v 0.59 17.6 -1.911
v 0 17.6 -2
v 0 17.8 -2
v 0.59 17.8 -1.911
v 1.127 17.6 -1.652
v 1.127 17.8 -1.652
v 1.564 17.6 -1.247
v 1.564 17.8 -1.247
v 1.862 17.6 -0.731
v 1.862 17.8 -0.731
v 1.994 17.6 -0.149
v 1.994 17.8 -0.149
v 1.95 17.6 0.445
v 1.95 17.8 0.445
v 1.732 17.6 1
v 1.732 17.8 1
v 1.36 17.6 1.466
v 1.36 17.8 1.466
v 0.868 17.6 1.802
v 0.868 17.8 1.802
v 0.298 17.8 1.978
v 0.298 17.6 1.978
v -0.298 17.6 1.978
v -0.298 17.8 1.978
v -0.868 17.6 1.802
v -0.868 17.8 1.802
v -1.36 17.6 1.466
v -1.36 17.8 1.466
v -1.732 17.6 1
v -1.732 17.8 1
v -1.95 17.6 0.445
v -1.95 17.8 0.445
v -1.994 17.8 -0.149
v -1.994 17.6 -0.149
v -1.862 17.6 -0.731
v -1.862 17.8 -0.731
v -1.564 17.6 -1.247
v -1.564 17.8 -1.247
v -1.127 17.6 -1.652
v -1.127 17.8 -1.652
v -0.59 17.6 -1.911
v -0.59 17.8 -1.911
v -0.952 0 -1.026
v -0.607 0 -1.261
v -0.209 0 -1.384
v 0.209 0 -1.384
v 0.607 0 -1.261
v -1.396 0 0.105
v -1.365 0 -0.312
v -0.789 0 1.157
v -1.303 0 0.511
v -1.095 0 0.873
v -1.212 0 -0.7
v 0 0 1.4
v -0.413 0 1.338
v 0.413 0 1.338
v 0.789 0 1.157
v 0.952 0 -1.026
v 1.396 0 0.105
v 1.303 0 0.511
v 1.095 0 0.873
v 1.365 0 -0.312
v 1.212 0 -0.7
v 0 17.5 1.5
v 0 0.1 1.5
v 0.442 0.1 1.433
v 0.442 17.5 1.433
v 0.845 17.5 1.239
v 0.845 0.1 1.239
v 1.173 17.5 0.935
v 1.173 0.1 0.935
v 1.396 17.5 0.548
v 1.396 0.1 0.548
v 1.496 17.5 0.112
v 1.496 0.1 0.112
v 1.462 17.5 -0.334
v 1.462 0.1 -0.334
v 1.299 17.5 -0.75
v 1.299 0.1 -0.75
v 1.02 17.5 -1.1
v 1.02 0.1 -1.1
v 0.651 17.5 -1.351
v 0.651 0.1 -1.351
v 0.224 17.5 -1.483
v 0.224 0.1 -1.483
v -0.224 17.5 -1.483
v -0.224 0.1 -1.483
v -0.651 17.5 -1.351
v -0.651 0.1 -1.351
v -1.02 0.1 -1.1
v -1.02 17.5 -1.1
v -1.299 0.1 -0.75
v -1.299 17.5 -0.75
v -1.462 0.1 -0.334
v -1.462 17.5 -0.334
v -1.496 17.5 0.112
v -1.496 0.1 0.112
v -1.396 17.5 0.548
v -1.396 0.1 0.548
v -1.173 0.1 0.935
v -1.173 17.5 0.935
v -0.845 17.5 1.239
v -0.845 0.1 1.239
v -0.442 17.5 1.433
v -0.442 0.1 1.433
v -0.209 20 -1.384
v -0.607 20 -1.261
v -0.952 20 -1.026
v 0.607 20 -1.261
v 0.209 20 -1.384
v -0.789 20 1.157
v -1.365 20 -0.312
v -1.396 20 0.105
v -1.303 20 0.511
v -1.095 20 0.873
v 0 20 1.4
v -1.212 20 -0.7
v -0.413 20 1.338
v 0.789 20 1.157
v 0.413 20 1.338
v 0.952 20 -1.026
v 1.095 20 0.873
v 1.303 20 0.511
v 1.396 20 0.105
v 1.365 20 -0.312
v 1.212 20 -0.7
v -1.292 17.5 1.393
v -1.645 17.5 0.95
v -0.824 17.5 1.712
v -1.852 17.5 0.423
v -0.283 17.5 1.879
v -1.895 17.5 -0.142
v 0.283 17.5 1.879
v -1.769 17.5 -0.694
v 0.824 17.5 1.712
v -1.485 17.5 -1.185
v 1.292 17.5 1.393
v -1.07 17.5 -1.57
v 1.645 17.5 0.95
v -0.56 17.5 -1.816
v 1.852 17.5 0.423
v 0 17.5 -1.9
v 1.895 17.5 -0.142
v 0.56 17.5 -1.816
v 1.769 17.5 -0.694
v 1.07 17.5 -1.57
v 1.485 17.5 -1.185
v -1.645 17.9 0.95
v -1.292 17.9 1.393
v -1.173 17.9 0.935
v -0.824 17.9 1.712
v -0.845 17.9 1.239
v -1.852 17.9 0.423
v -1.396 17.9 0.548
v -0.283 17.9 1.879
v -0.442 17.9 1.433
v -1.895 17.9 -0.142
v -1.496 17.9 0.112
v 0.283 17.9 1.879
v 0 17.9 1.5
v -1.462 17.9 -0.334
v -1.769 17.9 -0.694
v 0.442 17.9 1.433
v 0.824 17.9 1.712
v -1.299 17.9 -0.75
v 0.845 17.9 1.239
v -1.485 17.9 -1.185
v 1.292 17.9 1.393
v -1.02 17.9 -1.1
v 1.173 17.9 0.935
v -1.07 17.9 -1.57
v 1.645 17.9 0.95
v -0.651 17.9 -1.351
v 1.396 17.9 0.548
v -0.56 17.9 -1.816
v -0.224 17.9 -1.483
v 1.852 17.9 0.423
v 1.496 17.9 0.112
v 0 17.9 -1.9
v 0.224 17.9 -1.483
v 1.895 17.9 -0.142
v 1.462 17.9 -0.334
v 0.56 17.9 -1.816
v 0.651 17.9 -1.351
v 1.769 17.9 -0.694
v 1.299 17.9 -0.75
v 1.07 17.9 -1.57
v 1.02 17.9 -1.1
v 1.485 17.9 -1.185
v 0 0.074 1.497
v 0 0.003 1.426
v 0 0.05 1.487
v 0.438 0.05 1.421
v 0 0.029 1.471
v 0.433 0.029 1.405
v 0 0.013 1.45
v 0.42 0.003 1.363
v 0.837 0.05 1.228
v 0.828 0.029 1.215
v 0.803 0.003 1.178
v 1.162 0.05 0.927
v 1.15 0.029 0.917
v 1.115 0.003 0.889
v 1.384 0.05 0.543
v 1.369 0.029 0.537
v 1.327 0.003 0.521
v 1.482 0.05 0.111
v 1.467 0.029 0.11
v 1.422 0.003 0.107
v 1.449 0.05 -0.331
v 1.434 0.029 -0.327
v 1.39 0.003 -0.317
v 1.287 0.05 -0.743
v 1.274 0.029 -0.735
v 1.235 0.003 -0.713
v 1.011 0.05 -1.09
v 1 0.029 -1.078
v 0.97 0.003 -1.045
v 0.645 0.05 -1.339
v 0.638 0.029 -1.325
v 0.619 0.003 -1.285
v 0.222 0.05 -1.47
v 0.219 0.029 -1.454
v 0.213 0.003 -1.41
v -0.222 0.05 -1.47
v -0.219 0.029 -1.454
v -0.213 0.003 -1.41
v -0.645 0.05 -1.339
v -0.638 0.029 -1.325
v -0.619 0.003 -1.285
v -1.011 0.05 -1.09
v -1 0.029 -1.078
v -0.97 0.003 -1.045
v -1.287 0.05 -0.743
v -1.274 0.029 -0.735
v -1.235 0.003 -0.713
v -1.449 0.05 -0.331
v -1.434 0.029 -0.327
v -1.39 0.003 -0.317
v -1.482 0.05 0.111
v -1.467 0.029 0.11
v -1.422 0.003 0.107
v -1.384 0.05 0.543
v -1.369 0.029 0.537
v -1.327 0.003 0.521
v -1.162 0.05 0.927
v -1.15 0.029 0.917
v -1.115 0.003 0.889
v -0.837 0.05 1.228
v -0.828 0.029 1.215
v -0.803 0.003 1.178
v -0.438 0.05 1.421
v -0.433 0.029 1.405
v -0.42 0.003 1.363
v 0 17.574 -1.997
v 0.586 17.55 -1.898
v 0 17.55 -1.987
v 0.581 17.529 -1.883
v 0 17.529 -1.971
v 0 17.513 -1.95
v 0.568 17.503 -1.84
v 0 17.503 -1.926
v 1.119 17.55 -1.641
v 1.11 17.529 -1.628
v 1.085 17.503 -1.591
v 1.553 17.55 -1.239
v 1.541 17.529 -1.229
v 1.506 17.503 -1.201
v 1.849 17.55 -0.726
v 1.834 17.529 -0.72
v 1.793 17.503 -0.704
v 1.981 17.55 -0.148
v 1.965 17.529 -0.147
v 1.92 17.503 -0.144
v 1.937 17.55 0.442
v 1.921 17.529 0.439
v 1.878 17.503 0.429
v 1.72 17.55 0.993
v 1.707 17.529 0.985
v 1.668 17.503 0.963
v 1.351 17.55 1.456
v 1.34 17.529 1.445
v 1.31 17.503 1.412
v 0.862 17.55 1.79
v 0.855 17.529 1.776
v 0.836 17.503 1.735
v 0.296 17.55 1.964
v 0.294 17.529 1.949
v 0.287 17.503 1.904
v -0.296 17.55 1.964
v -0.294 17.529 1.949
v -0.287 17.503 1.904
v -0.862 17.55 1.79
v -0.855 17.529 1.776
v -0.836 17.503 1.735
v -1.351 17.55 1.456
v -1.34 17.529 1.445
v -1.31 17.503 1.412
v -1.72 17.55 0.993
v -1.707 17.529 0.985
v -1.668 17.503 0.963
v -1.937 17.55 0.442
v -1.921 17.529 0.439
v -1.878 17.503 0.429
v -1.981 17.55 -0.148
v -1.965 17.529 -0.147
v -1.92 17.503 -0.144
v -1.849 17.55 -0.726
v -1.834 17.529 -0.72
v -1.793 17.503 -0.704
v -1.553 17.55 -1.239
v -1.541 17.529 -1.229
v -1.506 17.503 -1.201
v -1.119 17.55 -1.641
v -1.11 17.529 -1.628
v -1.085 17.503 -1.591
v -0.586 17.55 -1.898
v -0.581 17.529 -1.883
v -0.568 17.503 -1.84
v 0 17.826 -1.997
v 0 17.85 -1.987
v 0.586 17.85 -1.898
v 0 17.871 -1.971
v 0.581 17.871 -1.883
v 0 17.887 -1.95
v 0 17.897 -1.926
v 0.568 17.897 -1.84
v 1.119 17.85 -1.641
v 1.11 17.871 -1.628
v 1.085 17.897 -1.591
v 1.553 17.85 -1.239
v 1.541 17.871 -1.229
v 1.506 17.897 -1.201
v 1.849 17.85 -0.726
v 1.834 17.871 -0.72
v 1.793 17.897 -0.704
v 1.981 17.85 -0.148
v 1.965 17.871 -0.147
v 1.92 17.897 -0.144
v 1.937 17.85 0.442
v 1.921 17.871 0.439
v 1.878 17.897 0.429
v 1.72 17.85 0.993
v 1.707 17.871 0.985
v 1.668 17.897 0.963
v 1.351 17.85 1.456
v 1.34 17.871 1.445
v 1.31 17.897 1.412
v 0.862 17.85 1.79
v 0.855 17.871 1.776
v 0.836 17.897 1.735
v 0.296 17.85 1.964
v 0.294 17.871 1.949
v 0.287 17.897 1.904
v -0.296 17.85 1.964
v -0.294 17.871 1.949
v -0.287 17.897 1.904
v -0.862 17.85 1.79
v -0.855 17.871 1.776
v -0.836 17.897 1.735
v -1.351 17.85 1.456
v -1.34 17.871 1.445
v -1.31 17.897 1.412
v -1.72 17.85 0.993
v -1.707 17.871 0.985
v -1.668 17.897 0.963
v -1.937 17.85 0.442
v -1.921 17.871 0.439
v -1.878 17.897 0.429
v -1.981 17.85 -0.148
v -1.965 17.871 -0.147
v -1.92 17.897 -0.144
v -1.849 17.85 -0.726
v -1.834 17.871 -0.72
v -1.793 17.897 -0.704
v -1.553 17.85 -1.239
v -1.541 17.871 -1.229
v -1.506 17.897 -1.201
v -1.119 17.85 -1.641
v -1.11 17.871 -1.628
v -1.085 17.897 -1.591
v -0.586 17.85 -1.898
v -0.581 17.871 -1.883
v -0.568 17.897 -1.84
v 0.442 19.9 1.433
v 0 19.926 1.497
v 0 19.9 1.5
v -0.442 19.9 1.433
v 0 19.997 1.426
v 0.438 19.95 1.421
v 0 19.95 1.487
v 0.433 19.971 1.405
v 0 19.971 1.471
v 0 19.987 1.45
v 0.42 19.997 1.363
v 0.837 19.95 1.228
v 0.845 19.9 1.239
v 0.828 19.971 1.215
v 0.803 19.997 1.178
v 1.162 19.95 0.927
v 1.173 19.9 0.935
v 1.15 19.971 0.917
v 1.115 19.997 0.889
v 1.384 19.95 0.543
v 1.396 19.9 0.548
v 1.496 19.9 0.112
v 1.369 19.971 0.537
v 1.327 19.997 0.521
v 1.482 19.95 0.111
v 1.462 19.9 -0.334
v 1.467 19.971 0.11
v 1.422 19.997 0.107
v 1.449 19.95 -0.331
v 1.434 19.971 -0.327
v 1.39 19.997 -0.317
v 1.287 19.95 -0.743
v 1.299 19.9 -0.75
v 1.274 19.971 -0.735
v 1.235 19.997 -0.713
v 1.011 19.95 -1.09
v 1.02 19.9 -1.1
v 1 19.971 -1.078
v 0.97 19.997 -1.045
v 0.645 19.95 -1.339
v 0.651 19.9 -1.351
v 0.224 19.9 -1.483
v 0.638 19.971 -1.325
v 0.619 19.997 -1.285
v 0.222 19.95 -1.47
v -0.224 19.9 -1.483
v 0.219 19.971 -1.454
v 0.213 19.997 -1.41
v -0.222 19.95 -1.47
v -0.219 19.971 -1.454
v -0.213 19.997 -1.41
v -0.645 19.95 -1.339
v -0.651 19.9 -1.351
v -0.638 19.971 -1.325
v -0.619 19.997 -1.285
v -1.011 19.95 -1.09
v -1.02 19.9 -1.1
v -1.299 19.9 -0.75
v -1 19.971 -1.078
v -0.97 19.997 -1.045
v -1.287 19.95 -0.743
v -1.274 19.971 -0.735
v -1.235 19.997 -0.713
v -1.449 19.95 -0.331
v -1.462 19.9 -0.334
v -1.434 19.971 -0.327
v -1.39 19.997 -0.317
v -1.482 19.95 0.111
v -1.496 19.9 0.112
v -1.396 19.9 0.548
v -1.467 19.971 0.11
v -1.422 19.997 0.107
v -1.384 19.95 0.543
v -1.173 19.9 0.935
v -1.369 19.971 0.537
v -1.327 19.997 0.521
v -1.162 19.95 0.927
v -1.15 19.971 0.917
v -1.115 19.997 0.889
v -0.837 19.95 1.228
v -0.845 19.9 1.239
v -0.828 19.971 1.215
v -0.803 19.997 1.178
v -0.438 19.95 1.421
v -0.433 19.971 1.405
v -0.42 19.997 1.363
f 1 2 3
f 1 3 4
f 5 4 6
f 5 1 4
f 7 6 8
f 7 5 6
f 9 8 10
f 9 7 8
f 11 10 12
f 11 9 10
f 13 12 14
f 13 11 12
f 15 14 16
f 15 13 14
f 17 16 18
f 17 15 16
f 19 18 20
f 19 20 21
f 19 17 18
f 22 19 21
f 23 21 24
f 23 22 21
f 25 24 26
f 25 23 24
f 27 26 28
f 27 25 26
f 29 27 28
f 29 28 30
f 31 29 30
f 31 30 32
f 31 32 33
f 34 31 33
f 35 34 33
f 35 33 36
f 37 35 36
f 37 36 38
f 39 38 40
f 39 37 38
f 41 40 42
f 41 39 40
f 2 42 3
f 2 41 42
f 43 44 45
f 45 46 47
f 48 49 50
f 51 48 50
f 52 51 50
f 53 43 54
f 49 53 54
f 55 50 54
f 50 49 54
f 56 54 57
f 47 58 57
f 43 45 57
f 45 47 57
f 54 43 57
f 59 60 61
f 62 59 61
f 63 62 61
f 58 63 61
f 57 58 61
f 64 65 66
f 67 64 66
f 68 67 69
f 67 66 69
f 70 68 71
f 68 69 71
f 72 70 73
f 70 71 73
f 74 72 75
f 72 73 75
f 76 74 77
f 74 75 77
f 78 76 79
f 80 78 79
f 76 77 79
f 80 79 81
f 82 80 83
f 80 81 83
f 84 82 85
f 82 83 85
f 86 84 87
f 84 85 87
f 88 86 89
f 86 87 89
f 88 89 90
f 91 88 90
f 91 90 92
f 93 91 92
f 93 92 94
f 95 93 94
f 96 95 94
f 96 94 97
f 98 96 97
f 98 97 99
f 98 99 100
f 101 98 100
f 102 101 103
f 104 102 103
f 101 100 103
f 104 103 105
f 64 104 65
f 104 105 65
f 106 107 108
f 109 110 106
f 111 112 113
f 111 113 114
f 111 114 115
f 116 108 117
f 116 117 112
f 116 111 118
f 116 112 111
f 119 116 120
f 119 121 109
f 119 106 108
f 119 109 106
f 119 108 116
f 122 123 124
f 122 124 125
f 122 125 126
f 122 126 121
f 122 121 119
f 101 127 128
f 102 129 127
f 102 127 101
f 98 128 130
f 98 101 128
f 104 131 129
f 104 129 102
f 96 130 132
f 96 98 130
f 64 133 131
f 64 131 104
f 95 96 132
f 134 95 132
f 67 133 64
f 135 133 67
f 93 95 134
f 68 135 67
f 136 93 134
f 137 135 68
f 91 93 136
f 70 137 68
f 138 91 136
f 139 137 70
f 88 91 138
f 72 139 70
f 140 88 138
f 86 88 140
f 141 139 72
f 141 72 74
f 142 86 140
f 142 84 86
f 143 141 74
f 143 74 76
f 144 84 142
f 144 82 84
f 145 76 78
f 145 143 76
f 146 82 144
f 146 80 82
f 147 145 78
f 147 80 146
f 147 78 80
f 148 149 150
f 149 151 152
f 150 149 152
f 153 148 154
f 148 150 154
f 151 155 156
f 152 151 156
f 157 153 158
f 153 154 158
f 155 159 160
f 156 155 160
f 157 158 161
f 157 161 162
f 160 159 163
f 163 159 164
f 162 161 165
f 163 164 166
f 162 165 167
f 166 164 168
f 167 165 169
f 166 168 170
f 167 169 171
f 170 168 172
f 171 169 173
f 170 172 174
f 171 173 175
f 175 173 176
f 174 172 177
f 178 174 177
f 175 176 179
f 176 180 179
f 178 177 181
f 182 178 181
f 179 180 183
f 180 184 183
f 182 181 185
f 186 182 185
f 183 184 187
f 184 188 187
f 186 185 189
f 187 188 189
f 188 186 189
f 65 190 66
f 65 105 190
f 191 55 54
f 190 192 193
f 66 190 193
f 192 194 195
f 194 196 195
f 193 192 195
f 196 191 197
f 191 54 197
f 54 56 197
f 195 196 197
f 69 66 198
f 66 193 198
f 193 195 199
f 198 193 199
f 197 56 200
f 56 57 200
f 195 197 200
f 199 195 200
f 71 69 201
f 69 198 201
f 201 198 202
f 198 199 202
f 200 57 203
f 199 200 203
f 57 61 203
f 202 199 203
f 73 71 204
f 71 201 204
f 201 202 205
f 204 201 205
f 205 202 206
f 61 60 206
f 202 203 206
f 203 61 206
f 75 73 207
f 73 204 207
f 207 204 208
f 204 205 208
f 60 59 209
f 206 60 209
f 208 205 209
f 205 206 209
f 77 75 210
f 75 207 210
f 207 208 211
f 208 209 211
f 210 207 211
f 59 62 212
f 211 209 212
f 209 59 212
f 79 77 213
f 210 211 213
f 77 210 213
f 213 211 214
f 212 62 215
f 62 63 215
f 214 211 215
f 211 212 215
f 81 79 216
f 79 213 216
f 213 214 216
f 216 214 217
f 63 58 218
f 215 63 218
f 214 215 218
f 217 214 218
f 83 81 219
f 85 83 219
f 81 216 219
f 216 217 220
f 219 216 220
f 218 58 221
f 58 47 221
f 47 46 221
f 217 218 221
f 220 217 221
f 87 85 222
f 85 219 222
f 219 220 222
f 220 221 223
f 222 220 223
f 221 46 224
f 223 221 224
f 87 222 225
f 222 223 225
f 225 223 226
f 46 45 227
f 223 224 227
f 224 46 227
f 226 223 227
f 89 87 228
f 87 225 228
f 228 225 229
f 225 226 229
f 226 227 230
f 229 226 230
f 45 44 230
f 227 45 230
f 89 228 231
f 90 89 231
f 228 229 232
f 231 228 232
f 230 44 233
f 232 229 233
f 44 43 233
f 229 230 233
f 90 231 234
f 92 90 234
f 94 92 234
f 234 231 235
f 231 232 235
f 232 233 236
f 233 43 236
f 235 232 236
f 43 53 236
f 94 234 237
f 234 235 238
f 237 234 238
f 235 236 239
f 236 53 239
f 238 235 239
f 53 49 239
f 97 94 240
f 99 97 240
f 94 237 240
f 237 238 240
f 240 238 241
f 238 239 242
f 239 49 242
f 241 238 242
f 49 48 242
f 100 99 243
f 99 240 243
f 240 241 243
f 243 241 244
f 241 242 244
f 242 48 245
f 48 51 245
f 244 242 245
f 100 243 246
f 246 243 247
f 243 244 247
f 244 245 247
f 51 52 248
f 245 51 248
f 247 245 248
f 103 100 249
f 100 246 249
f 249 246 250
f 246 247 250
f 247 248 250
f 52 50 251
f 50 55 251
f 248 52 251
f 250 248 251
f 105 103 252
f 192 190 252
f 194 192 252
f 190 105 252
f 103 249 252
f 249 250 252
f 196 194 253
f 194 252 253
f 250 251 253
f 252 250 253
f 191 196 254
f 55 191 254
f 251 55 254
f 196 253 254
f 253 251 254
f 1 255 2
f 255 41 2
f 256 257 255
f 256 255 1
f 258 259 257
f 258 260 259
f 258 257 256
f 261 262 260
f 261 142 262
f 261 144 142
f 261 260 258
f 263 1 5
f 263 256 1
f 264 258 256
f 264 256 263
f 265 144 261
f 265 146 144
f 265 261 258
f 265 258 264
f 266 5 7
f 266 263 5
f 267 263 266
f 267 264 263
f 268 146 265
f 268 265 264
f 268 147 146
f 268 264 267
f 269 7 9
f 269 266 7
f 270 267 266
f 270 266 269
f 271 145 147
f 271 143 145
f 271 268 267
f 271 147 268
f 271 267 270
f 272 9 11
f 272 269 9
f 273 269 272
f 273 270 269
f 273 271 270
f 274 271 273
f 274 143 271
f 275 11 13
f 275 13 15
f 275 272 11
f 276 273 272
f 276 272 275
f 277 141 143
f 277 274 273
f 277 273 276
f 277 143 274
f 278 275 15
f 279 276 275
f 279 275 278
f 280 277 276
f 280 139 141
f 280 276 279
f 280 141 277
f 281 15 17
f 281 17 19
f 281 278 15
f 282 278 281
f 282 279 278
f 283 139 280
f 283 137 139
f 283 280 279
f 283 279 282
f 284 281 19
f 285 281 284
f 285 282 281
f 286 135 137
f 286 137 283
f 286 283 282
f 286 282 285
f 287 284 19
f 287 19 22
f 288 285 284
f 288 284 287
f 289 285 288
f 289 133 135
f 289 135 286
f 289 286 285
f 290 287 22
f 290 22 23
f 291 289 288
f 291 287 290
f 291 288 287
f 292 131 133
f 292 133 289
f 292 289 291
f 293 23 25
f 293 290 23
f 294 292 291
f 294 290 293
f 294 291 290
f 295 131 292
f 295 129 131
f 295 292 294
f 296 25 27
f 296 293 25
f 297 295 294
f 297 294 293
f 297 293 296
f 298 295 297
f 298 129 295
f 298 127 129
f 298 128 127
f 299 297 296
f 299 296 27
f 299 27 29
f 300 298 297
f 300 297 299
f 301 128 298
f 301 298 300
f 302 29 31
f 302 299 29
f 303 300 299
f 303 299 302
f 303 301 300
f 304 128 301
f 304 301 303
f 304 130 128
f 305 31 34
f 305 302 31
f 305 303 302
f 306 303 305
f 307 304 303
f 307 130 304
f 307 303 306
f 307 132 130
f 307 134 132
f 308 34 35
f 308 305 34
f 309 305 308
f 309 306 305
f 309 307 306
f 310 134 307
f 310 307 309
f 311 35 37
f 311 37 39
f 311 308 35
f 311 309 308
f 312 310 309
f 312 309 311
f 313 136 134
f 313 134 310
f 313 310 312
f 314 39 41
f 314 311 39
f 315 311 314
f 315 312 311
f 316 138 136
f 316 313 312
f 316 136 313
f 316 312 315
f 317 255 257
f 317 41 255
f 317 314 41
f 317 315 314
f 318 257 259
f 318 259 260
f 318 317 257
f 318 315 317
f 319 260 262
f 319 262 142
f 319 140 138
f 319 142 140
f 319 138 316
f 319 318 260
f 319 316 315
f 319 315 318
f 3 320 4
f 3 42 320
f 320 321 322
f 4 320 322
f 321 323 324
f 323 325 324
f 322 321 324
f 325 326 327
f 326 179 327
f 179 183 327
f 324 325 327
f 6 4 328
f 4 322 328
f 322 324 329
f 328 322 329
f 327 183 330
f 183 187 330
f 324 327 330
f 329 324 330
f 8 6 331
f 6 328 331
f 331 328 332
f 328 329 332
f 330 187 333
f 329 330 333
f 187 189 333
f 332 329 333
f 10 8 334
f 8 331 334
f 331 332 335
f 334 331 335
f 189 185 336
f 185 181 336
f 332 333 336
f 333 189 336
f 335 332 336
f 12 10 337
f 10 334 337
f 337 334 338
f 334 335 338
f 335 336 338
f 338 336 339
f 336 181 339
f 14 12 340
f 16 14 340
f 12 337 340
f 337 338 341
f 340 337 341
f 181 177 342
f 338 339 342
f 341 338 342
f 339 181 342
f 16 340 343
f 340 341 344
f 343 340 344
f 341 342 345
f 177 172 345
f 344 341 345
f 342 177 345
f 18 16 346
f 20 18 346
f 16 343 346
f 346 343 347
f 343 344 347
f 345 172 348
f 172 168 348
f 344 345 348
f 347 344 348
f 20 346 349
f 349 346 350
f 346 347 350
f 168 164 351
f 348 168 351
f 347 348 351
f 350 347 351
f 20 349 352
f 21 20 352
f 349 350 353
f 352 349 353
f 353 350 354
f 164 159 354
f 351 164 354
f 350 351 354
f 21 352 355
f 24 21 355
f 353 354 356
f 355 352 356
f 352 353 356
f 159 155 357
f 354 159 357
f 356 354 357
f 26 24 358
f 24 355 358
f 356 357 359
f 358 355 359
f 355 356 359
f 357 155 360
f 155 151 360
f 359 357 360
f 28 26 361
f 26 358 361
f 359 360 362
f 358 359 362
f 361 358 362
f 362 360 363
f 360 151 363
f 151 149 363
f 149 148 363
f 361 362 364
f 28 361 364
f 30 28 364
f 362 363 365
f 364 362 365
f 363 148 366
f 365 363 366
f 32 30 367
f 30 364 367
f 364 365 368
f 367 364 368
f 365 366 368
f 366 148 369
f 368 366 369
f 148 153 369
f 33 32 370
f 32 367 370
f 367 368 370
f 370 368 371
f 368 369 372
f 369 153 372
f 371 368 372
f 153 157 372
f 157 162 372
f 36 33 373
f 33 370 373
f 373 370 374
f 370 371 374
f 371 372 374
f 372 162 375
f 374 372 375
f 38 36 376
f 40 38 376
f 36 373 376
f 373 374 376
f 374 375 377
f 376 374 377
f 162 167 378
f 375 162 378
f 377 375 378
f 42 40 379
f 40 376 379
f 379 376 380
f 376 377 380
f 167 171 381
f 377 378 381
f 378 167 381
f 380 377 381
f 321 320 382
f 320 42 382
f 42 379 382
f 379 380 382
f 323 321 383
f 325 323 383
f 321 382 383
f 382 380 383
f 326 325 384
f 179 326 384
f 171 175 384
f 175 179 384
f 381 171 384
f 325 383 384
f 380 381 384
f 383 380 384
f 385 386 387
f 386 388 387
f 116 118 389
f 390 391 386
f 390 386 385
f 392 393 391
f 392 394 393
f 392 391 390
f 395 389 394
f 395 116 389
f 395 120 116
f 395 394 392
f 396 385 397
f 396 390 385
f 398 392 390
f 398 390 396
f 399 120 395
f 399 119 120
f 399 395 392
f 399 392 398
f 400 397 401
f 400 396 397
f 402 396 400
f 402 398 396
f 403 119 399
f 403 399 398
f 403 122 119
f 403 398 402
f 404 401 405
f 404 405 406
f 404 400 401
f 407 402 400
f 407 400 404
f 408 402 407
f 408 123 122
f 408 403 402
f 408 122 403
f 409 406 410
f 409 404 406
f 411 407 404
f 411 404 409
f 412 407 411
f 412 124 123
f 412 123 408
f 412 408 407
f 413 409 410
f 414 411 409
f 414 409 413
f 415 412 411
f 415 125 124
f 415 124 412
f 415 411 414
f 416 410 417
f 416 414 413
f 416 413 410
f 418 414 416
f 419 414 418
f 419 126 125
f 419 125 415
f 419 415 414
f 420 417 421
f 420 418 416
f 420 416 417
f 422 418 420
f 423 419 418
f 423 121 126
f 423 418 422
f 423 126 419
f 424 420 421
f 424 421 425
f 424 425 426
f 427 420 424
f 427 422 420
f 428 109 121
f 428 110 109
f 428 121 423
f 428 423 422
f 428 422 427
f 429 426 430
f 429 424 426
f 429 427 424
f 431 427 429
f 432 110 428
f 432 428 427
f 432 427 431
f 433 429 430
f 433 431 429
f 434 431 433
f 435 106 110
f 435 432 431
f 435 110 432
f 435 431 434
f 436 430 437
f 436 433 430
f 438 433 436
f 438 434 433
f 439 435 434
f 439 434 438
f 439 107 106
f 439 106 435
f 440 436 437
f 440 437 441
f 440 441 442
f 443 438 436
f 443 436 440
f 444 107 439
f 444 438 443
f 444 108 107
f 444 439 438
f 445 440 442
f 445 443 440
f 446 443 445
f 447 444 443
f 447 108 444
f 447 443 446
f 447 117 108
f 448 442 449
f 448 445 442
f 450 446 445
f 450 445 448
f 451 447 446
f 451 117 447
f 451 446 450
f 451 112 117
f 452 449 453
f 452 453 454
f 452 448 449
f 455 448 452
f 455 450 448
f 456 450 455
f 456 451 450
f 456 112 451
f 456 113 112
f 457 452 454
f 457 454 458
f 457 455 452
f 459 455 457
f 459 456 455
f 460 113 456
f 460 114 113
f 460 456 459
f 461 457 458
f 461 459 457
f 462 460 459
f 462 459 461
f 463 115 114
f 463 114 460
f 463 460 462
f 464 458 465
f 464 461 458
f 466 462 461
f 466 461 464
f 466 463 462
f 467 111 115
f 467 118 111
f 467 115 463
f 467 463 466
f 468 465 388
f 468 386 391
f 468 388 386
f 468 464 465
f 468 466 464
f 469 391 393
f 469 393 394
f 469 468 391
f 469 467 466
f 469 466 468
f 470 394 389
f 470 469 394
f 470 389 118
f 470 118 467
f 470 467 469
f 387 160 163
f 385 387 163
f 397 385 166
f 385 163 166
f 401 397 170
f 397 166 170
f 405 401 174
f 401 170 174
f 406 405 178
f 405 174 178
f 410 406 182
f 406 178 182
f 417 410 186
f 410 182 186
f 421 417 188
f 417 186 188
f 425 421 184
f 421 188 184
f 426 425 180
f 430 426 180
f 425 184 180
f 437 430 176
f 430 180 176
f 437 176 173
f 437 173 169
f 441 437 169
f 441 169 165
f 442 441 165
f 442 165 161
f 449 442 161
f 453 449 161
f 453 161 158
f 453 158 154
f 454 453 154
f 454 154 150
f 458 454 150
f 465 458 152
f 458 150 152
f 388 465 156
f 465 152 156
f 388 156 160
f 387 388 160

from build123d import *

# Parameters (mm, degrees)
SKETCH_1_R      = 1.5
EXTRUDE_1_DEPTH = 20
EXTRUDE_START   = 2.5
SKETCH_2_R      = 2
SKETCH_2_R_2    = 1.5
EXTRUDE_2_DEPTH = 0.4
FILLET_1_R      = 0.1


with BuildPart() as part:
    # 草图1 → 凸台-拉伸1 (new body)
    with BuildSketch(Plane(origin=(0, 0, 0), x_dir=(1, 0, 0), z_dir=(0, 1, 0))):
        with Locations(Location((0, 0, 0), (0, 0, 270))):
            Circle(SKETCH_1_R)
    extrude(amount=EXTRUDE_1_DEPTH)

    # 草图2 → 凸台-拉伸2 (add)
    with BuildSketch(Plane.XZ.offset(-20).offset(EXTRUDE_START)):
        with Locations(Location((0, 0, 0), (0, 0, 270))):
            Circle(SKETCH_2_R)
        with Locations(Location((0, 0, 0), (0, 0, 270))):
            Circle(SKETCH_2_R_2, mode=Mode.SUBTRACT)
    extrude(amount=-EXTRUDE_2_DEPTH)

    # 圆角1
    fillet_1_edges = [part.edges().sort_by_distance(p)[0] for p in [
        (0, 0, -1.5),
        (0, 20, -1.5),
        (0, 17.5, 2),
        (0, 17.9, 2),
    ]]
    fillet(fillet_1_edges, radius=FILLET_1_R)


solid = part.part
